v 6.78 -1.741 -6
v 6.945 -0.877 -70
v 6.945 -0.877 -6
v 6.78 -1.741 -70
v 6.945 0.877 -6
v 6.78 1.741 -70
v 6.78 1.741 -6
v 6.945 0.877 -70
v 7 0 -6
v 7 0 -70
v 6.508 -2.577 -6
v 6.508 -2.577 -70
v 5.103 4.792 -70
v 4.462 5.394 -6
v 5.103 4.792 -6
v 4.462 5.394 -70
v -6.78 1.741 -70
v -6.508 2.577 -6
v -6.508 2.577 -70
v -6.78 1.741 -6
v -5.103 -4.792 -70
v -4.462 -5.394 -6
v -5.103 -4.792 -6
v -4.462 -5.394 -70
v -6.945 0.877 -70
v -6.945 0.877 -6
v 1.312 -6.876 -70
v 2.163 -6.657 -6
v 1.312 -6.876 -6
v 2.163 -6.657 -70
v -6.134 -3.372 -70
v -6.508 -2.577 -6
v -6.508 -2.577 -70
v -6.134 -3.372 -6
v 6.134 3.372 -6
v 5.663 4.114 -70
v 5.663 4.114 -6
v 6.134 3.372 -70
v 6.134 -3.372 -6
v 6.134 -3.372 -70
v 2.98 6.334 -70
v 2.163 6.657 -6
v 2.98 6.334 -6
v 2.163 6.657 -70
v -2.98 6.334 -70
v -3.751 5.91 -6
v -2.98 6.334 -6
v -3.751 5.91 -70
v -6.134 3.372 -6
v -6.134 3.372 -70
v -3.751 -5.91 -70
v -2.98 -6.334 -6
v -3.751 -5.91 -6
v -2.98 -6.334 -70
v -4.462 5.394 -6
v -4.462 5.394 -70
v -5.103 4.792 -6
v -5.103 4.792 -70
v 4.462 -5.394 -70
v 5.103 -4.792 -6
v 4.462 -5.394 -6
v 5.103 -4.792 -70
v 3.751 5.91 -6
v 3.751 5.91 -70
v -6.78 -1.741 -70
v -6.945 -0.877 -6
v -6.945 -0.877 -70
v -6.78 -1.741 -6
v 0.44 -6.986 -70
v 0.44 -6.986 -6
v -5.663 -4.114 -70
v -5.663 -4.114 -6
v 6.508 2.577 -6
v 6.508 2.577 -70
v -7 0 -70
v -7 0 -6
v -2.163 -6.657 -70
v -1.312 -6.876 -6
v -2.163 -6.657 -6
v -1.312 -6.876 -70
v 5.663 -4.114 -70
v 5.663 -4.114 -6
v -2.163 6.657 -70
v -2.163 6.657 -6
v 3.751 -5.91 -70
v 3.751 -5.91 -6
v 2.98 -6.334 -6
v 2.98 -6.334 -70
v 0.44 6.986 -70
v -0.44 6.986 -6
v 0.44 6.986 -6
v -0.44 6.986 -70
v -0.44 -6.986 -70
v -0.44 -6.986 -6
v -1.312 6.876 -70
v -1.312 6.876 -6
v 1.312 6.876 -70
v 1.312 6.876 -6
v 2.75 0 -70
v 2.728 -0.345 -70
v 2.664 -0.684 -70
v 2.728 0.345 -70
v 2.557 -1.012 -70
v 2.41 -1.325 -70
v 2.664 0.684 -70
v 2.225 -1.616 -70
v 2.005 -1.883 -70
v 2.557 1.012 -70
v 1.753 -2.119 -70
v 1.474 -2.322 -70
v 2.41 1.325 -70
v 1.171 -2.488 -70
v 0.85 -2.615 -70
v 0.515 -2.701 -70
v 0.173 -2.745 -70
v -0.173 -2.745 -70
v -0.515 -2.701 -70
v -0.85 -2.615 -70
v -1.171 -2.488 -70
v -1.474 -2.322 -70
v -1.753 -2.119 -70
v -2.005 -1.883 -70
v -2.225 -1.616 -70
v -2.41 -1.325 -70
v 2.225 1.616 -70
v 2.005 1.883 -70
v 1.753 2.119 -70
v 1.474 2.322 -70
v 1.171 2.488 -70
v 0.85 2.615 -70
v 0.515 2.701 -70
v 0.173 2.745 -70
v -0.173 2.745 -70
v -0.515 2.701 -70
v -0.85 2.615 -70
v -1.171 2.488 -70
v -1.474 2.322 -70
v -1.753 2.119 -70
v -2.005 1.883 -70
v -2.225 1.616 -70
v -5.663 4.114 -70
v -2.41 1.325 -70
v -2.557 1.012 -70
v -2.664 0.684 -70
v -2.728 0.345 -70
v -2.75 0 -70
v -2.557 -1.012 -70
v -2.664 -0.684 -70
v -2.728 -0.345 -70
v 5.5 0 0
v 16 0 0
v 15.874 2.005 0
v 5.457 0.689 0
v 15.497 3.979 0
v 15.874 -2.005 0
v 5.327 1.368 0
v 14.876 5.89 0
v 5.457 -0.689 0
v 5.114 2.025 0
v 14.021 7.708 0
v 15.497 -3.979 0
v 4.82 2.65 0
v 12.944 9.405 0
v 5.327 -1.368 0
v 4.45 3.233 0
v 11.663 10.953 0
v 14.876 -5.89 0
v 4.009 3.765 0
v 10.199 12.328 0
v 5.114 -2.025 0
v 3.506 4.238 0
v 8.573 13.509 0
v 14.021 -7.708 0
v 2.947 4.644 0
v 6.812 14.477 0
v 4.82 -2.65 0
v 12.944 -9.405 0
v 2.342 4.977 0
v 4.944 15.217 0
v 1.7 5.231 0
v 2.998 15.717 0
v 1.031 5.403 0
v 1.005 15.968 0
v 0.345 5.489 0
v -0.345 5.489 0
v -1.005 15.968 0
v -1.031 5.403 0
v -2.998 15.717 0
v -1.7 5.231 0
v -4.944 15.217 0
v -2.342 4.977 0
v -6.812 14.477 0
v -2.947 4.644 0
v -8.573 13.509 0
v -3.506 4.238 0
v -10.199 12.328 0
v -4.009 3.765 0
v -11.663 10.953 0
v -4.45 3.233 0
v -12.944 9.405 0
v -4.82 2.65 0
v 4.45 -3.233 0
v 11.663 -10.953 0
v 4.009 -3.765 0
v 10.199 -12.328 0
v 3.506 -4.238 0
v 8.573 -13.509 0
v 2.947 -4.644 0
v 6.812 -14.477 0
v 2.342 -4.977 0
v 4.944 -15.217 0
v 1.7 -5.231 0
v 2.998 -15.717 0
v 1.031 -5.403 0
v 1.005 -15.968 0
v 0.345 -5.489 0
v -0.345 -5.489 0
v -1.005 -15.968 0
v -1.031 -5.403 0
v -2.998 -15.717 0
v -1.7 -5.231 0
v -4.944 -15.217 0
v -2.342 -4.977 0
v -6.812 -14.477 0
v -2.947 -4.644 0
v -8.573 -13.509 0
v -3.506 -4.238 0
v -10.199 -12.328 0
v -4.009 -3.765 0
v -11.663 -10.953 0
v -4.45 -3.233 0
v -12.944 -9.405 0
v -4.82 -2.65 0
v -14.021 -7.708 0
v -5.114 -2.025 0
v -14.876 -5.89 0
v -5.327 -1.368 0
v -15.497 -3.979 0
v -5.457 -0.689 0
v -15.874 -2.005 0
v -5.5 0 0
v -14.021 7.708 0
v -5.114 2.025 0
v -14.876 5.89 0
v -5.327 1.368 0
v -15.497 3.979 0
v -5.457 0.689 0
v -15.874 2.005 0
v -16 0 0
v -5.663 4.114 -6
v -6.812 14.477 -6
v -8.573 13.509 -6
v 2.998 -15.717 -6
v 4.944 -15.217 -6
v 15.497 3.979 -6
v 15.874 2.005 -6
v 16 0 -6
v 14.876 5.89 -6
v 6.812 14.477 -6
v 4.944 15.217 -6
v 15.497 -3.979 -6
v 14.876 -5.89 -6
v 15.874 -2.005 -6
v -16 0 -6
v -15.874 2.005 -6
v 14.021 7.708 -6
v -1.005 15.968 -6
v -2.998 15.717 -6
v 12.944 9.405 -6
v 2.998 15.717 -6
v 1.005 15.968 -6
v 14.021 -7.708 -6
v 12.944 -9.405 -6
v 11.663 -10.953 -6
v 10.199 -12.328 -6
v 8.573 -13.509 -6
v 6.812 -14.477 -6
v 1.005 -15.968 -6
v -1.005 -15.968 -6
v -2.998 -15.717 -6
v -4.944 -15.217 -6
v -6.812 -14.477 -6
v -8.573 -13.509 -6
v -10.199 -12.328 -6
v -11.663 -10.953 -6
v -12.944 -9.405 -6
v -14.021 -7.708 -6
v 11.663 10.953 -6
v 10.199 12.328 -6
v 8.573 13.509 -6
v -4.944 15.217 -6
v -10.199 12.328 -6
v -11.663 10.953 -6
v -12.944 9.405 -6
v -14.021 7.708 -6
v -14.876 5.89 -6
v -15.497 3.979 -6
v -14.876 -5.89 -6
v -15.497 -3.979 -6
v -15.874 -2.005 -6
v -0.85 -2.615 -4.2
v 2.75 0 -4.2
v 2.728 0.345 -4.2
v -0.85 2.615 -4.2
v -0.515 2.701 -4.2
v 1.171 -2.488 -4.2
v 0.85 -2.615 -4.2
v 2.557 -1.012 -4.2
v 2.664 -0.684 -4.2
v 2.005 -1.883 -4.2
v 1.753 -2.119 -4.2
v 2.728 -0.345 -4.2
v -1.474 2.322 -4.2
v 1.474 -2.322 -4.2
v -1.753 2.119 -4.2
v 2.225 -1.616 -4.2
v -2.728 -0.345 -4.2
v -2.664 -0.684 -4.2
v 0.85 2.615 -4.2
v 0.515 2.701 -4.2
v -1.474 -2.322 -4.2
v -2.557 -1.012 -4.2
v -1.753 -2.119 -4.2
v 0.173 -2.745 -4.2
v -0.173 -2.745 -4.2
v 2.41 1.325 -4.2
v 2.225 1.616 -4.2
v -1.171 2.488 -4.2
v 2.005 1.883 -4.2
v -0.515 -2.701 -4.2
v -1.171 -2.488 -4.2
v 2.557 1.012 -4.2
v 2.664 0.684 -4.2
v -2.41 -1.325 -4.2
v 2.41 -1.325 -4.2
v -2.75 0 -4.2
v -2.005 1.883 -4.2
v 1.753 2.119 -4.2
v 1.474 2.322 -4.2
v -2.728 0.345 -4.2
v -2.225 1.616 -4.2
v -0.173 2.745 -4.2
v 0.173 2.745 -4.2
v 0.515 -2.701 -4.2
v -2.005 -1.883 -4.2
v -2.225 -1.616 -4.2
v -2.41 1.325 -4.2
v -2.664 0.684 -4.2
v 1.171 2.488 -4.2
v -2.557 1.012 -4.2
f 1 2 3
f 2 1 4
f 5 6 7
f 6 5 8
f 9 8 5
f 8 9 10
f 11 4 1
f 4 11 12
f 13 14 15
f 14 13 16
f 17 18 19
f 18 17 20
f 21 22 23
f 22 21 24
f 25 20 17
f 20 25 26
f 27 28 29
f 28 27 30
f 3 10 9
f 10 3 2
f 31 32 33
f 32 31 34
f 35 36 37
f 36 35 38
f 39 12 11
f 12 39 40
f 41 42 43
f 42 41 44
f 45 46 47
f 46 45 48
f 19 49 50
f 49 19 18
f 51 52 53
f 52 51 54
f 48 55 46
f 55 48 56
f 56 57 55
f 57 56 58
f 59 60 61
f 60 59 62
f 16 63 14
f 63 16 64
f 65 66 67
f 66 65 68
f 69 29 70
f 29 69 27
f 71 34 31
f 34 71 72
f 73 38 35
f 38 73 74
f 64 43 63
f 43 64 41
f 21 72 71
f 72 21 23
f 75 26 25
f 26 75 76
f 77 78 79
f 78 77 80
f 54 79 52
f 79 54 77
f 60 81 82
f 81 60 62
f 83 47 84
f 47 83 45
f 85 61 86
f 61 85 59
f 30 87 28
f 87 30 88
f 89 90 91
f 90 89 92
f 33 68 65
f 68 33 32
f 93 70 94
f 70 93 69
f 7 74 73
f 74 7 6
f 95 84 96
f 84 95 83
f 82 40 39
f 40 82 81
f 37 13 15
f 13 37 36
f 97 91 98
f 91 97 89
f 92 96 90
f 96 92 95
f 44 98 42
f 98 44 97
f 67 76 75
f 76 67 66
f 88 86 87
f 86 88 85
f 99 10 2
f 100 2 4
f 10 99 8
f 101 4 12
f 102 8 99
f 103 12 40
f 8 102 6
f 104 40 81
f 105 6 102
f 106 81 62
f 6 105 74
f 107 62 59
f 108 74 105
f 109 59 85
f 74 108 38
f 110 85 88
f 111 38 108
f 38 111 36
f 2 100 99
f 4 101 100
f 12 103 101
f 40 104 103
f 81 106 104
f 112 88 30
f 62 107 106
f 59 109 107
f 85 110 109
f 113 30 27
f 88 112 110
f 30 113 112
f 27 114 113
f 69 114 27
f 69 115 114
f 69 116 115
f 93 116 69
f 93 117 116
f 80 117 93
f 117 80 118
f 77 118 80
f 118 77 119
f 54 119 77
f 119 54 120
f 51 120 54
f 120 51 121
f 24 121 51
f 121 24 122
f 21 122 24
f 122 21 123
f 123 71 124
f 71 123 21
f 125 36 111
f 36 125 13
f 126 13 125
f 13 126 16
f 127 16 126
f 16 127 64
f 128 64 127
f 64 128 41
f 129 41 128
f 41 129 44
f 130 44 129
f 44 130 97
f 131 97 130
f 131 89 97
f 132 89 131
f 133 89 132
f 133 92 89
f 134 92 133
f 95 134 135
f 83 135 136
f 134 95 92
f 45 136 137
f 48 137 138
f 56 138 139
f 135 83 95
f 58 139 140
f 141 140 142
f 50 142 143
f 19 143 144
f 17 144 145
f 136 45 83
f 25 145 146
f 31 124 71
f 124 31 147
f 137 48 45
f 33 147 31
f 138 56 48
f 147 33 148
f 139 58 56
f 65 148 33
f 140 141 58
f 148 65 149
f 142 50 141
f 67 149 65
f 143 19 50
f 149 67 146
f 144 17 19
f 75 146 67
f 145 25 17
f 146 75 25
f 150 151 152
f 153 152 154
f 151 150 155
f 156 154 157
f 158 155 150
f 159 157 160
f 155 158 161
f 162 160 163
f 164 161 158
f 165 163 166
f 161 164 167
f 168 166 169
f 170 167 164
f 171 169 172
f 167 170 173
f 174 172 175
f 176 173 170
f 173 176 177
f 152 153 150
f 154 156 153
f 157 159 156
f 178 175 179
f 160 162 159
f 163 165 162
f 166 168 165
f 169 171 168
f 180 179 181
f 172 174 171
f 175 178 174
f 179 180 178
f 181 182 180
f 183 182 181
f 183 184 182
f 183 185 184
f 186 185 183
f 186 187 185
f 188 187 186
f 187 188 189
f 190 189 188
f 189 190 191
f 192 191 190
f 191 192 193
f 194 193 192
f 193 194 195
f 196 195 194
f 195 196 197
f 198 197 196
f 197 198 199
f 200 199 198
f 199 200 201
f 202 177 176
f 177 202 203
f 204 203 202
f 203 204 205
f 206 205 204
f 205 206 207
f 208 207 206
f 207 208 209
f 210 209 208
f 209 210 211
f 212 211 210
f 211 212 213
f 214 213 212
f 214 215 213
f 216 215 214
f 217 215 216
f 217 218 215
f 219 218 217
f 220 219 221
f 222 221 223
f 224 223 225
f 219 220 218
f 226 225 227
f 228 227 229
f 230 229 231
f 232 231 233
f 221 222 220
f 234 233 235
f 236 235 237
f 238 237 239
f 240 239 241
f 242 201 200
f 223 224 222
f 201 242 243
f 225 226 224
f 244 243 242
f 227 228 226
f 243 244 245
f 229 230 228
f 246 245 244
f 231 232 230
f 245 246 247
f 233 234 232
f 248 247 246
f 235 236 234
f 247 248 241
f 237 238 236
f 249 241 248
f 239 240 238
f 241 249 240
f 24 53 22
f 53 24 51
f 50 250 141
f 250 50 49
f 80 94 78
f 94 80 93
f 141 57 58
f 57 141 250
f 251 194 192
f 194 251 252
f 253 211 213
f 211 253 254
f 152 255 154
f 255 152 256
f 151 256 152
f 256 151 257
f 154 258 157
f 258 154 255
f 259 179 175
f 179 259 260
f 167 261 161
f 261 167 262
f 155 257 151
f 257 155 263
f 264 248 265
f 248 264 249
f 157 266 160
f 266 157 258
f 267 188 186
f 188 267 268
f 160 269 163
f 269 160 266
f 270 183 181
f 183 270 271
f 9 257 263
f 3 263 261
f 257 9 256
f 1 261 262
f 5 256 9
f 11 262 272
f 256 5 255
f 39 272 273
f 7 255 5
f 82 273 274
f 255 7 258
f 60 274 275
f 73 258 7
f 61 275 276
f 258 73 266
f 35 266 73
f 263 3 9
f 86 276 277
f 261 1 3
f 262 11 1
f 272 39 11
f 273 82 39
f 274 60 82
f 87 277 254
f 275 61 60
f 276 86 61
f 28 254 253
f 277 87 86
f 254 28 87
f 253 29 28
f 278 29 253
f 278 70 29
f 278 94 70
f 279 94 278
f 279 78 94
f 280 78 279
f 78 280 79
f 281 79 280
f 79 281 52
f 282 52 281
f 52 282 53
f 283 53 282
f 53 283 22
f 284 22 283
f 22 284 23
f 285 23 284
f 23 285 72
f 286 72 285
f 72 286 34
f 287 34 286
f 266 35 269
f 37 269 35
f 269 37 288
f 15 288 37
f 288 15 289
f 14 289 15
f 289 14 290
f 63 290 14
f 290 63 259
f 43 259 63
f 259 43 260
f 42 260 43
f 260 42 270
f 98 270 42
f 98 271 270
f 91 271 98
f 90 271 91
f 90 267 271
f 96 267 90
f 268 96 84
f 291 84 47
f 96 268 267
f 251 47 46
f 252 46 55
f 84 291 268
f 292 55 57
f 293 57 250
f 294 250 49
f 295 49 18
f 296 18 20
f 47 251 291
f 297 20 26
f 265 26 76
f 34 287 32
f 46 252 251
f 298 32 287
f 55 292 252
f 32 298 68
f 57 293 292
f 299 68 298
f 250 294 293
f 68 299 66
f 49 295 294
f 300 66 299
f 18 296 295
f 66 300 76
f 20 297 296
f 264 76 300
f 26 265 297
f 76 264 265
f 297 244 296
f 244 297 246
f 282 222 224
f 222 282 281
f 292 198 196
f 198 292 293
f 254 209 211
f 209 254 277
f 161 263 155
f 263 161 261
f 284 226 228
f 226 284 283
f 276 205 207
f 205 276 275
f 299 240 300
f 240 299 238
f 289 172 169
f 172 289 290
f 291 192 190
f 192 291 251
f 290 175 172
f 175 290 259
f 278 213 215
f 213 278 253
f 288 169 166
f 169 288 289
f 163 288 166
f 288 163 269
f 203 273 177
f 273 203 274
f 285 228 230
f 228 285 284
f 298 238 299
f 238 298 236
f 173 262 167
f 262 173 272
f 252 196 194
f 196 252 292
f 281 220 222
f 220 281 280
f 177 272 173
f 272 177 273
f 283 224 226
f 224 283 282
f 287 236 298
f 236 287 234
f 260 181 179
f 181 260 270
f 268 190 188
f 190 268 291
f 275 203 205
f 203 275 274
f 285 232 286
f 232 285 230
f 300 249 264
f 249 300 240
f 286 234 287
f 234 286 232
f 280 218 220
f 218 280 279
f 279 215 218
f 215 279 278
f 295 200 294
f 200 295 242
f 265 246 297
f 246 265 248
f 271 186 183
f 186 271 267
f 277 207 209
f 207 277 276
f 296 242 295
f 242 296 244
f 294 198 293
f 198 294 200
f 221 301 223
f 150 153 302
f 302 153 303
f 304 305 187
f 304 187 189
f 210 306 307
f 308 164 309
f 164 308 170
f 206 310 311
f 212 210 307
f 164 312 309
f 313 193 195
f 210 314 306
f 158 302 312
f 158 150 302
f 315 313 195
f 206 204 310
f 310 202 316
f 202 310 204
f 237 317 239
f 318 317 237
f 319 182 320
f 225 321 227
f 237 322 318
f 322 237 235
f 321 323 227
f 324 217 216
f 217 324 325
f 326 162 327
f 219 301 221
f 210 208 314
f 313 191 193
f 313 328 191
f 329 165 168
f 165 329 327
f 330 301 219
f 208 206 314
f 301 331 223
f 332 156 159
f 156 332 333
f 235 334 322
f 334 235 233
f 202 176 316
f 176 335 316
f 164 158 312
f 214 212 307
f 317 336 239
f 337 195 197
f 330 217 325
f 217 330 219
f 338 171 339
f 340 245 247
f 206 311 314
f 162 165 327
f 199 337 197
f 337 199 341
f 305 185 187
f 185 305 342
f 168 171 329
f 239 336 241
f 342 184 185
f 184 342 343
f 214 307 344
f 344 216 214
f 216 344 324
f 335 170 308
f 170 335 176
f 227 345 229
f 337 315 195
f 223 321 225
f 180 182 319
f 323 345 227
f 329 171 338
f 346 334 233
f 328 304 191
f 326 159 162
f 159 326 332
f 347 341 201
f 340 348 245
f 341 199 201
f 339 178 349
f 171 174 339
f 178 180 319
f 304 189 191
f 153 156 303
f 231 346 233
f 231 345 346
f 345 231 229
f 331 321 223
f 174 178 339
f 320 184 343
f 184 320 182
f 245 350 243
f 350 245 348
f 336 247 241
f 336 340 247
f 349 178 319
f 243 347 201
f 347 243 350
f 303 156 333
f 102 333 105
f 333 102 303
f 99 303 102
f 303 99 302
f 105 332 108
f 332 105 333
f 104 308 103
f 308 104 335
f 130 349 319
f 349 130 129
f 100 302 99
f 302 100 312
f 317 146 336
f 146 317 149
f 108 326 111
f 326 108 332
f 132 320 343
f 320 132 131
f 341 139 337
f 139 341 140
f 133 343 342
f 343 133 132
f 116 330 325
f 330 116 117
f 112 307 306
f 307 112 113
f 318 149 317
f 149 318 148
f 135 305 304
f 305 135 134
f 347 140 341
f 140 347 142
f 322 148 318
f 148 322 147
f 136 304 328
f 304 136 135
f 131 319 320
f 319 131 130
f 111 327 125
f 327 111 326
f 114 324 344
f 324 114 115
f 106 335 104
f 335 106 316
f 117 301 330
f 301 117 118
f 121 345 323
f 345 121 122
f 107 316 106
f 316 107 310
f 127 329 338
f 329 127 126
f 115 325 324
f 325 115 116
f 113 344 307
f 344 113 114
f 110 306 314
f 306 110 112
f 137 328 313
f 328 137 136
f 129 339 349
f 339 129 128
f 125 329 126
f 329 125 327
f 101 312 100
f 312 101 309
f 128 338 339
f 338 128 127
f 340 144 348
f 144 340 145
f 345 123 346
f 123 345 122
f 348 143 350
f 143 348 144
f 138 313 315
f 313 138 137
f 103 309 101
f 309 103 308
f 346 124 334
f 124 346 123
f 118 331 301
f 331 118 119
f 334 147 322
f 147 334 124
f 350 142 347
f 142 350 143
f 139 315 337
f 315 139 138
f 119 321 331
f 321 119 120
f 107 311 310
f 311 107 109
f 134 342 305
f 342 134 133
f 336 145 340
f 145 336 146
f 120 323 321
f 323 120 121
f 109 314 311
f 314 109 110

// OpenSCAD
$fn = 50;


difference() {
	union() {
		translate(v = [0, 0, -70.0000000000]) {
			cylinder(h = 70, r = 7.0000000000);
		}
		translate(v = [0, 0, -6.0000000000]) {
			cylinder(h = 6, r = 16.0000000000);
		}
	}
	union() {
		translate(v = [0, 0, 0]) {
			rotate(a = [0, 0, 0]) {
				difference() {
					union() {
						#translate(v = [0, 0, -70.0000000000]) {
							cylinder(h = 70, r = 2.2500000000);
						}
						#translate(v = [0, 0, -4.2000000000]) {
							cylinder(h = 4.2000000000, r1 = 2.7500000000, r2 = 5.5000000000);
						}
						#translate(v = [0, 0, -70.0000000000]) {
							cylinder(h = 70, r = 2.7500000000);
						}
						#translate(v = [0, 0, -70.0000000000]) {
							cylinder(h = 70, r = 2.2500000000);
						}
					}
					union();
				}
			}
		}
	}
}
